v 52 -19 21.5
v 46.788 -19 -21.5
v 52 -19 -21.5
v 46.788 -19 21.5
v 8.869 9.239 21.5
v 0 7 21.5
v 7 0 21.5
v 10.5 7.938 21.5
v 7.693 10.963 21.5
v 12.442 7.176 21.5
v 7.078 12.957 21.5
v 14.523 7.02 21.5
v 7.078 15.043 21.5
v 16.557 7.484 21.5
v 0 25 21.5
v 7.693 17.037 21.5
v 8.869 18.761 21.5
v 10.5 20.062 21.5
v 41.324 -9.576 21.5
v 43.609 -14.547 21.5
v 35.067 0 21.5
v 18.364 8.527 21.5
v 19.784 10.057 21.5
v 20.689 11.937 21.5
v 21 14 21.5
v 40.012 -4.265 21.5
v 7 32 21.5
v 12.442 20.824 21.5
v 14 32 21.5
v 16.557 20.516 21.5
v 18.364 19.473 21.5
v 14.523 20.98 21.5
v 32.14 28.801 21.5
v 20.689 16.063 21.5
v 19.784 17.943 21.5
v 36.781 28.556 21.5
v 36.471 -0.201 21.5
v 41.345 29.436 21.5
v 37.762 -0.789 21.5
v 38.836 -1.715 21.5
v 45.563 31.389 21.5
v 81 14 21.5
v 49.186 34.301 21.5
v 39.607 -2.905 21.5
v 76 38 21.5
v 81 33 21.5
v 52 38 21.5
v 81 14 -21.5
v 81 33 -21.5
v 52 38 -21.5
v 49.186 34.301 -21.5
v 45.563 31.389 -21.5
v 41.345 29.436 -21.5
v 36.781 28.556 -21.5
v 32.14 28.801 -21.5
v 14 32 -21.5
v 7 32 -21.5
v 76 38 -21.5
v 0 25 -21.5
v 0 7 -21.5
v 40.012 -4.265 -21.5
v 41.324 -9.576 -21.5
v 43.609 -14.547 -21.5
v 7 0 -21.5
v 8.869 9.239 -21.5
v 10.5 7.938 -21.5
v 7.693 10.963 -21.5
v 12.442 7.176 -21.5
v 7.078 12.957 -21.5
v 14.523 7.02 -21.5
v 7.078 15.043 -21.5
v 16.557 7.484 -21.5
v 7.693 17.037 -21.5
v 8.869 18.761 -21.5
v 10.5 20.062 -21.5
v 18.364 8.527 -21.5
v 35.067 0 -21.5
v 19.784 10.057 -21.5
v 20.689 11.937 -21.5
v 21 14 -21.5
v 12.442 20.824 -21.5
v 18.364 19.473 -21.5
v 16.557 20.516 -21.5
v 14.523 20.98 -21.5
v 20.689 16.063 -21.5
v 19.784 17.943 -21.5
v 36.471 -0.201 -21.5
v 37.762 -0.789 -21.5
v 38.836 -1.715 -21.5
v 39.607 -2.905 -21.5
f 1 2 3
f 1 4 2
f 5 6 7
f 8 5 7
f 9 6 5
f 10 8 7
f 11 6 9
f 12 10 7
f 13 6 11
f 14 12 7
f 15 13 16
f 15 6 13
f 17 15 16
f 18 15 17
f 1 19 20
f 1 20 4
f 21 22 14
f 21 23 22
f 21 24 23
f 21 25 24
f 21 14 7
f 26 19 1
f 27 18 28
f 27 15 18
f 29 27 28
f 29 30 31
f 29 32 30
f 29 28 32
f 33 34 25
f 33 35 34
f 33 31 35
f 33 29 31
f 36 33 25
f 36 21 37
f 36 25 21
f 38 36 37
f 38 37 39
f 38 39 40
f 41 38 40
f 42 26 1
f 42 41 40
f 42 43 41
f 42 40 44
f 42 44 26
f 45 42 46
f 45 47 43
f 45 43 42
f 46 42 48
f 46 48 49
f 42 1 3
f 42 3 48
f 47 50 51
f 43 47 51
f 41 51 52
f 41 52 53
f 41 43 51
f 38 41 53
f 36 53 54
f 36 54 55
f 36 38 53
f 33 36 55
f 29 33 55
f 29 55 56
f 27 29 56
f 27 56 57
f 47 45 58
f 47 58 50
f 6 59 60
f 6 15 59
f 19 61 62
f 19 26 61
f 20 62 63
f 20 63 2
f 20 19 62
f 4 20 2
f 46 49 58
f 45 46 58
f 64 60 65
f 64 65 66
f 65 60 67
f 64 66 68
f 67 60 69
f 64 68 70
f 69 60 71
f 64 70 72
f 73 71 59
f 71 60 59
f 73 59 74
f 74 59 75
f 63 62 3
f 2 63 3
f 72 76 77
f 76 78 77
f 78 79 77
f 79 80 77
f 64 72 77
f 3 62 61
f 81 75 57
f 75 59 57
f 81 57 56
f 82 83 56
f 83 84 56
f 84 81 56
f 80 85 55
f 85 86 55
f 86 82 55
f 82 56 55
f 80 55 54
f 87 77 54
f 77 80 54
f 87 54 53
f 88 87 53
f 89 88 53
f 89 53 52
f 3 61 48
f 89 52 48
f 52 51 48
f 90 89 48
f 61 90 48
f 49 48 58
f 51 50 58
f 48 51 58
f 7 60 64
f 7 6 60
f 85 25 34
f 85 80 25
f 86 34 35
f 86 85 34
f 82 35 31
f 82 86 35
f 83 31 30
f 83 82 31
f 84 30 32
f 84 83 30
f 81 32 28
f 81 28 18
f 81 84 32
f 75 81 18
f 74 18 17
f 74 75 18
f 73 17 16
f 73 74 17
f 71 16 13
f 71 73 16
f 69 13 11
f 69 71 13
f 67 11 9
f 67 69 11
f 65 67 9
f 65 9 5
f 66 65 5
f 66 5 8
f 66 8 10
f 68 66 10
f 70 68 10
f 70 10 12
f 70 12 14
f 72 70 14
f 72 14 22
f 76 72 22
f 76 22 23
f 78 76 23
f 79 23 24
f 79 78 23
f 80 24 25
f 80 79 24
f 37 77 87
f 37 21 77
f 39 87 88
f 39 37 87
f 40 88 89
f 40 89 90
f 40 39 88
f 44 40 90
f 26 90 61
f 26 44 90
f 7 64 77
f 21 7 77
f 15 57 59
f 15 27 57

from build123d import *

# Parameters (mm, degrees)
ESQUISSE2_R        = 7
BOSS_EXTRU_2_DEPTH = 21.5


with BuildPart() as part:
    # Esquisse2 → Boss.-Extru.2 (new body, symmetric)
    with BuildSketch(Plane.XY):
        with BuildLine():
            Line((46.788067397, -19), (52, -19))
            Line((52, -19), (81, 14))
            Line((81, 14), (81, 33))
            Line((81, 33), (76, 38))
            Line((76, 38), (52, 38))
            ThreePointArc((52, 38), (43.513473837, 30.283893076), (32.139737934, 28.801474779))
            Line((32.139737934, 28.801474779), (14, 32))
            Line((14, 32), (7, 32))
            Line((7, 32), (0, 25))
            Line((0, 25), (0, 7))
            Line((0, 7), (7, 0))
            Line((7, 0), (35.066626255, 0))
            ThreePointArc((35.066626255, 0), (38.331862036, -1.213413768), (40.012264997, -4.264705882))
            ThreePointArc((40.012264997, -4.264705882), (42.3490952, -12.115672061), (46.788067397, -19))
        make_face()
        with Locations((14, 14)):
            Circle(ESQUISSE2_R, mode=Mode.SUBTRACT)
    extrude(amount=BOSS_EXTRU_2_DEPTH, both=True)


solid = part.part
